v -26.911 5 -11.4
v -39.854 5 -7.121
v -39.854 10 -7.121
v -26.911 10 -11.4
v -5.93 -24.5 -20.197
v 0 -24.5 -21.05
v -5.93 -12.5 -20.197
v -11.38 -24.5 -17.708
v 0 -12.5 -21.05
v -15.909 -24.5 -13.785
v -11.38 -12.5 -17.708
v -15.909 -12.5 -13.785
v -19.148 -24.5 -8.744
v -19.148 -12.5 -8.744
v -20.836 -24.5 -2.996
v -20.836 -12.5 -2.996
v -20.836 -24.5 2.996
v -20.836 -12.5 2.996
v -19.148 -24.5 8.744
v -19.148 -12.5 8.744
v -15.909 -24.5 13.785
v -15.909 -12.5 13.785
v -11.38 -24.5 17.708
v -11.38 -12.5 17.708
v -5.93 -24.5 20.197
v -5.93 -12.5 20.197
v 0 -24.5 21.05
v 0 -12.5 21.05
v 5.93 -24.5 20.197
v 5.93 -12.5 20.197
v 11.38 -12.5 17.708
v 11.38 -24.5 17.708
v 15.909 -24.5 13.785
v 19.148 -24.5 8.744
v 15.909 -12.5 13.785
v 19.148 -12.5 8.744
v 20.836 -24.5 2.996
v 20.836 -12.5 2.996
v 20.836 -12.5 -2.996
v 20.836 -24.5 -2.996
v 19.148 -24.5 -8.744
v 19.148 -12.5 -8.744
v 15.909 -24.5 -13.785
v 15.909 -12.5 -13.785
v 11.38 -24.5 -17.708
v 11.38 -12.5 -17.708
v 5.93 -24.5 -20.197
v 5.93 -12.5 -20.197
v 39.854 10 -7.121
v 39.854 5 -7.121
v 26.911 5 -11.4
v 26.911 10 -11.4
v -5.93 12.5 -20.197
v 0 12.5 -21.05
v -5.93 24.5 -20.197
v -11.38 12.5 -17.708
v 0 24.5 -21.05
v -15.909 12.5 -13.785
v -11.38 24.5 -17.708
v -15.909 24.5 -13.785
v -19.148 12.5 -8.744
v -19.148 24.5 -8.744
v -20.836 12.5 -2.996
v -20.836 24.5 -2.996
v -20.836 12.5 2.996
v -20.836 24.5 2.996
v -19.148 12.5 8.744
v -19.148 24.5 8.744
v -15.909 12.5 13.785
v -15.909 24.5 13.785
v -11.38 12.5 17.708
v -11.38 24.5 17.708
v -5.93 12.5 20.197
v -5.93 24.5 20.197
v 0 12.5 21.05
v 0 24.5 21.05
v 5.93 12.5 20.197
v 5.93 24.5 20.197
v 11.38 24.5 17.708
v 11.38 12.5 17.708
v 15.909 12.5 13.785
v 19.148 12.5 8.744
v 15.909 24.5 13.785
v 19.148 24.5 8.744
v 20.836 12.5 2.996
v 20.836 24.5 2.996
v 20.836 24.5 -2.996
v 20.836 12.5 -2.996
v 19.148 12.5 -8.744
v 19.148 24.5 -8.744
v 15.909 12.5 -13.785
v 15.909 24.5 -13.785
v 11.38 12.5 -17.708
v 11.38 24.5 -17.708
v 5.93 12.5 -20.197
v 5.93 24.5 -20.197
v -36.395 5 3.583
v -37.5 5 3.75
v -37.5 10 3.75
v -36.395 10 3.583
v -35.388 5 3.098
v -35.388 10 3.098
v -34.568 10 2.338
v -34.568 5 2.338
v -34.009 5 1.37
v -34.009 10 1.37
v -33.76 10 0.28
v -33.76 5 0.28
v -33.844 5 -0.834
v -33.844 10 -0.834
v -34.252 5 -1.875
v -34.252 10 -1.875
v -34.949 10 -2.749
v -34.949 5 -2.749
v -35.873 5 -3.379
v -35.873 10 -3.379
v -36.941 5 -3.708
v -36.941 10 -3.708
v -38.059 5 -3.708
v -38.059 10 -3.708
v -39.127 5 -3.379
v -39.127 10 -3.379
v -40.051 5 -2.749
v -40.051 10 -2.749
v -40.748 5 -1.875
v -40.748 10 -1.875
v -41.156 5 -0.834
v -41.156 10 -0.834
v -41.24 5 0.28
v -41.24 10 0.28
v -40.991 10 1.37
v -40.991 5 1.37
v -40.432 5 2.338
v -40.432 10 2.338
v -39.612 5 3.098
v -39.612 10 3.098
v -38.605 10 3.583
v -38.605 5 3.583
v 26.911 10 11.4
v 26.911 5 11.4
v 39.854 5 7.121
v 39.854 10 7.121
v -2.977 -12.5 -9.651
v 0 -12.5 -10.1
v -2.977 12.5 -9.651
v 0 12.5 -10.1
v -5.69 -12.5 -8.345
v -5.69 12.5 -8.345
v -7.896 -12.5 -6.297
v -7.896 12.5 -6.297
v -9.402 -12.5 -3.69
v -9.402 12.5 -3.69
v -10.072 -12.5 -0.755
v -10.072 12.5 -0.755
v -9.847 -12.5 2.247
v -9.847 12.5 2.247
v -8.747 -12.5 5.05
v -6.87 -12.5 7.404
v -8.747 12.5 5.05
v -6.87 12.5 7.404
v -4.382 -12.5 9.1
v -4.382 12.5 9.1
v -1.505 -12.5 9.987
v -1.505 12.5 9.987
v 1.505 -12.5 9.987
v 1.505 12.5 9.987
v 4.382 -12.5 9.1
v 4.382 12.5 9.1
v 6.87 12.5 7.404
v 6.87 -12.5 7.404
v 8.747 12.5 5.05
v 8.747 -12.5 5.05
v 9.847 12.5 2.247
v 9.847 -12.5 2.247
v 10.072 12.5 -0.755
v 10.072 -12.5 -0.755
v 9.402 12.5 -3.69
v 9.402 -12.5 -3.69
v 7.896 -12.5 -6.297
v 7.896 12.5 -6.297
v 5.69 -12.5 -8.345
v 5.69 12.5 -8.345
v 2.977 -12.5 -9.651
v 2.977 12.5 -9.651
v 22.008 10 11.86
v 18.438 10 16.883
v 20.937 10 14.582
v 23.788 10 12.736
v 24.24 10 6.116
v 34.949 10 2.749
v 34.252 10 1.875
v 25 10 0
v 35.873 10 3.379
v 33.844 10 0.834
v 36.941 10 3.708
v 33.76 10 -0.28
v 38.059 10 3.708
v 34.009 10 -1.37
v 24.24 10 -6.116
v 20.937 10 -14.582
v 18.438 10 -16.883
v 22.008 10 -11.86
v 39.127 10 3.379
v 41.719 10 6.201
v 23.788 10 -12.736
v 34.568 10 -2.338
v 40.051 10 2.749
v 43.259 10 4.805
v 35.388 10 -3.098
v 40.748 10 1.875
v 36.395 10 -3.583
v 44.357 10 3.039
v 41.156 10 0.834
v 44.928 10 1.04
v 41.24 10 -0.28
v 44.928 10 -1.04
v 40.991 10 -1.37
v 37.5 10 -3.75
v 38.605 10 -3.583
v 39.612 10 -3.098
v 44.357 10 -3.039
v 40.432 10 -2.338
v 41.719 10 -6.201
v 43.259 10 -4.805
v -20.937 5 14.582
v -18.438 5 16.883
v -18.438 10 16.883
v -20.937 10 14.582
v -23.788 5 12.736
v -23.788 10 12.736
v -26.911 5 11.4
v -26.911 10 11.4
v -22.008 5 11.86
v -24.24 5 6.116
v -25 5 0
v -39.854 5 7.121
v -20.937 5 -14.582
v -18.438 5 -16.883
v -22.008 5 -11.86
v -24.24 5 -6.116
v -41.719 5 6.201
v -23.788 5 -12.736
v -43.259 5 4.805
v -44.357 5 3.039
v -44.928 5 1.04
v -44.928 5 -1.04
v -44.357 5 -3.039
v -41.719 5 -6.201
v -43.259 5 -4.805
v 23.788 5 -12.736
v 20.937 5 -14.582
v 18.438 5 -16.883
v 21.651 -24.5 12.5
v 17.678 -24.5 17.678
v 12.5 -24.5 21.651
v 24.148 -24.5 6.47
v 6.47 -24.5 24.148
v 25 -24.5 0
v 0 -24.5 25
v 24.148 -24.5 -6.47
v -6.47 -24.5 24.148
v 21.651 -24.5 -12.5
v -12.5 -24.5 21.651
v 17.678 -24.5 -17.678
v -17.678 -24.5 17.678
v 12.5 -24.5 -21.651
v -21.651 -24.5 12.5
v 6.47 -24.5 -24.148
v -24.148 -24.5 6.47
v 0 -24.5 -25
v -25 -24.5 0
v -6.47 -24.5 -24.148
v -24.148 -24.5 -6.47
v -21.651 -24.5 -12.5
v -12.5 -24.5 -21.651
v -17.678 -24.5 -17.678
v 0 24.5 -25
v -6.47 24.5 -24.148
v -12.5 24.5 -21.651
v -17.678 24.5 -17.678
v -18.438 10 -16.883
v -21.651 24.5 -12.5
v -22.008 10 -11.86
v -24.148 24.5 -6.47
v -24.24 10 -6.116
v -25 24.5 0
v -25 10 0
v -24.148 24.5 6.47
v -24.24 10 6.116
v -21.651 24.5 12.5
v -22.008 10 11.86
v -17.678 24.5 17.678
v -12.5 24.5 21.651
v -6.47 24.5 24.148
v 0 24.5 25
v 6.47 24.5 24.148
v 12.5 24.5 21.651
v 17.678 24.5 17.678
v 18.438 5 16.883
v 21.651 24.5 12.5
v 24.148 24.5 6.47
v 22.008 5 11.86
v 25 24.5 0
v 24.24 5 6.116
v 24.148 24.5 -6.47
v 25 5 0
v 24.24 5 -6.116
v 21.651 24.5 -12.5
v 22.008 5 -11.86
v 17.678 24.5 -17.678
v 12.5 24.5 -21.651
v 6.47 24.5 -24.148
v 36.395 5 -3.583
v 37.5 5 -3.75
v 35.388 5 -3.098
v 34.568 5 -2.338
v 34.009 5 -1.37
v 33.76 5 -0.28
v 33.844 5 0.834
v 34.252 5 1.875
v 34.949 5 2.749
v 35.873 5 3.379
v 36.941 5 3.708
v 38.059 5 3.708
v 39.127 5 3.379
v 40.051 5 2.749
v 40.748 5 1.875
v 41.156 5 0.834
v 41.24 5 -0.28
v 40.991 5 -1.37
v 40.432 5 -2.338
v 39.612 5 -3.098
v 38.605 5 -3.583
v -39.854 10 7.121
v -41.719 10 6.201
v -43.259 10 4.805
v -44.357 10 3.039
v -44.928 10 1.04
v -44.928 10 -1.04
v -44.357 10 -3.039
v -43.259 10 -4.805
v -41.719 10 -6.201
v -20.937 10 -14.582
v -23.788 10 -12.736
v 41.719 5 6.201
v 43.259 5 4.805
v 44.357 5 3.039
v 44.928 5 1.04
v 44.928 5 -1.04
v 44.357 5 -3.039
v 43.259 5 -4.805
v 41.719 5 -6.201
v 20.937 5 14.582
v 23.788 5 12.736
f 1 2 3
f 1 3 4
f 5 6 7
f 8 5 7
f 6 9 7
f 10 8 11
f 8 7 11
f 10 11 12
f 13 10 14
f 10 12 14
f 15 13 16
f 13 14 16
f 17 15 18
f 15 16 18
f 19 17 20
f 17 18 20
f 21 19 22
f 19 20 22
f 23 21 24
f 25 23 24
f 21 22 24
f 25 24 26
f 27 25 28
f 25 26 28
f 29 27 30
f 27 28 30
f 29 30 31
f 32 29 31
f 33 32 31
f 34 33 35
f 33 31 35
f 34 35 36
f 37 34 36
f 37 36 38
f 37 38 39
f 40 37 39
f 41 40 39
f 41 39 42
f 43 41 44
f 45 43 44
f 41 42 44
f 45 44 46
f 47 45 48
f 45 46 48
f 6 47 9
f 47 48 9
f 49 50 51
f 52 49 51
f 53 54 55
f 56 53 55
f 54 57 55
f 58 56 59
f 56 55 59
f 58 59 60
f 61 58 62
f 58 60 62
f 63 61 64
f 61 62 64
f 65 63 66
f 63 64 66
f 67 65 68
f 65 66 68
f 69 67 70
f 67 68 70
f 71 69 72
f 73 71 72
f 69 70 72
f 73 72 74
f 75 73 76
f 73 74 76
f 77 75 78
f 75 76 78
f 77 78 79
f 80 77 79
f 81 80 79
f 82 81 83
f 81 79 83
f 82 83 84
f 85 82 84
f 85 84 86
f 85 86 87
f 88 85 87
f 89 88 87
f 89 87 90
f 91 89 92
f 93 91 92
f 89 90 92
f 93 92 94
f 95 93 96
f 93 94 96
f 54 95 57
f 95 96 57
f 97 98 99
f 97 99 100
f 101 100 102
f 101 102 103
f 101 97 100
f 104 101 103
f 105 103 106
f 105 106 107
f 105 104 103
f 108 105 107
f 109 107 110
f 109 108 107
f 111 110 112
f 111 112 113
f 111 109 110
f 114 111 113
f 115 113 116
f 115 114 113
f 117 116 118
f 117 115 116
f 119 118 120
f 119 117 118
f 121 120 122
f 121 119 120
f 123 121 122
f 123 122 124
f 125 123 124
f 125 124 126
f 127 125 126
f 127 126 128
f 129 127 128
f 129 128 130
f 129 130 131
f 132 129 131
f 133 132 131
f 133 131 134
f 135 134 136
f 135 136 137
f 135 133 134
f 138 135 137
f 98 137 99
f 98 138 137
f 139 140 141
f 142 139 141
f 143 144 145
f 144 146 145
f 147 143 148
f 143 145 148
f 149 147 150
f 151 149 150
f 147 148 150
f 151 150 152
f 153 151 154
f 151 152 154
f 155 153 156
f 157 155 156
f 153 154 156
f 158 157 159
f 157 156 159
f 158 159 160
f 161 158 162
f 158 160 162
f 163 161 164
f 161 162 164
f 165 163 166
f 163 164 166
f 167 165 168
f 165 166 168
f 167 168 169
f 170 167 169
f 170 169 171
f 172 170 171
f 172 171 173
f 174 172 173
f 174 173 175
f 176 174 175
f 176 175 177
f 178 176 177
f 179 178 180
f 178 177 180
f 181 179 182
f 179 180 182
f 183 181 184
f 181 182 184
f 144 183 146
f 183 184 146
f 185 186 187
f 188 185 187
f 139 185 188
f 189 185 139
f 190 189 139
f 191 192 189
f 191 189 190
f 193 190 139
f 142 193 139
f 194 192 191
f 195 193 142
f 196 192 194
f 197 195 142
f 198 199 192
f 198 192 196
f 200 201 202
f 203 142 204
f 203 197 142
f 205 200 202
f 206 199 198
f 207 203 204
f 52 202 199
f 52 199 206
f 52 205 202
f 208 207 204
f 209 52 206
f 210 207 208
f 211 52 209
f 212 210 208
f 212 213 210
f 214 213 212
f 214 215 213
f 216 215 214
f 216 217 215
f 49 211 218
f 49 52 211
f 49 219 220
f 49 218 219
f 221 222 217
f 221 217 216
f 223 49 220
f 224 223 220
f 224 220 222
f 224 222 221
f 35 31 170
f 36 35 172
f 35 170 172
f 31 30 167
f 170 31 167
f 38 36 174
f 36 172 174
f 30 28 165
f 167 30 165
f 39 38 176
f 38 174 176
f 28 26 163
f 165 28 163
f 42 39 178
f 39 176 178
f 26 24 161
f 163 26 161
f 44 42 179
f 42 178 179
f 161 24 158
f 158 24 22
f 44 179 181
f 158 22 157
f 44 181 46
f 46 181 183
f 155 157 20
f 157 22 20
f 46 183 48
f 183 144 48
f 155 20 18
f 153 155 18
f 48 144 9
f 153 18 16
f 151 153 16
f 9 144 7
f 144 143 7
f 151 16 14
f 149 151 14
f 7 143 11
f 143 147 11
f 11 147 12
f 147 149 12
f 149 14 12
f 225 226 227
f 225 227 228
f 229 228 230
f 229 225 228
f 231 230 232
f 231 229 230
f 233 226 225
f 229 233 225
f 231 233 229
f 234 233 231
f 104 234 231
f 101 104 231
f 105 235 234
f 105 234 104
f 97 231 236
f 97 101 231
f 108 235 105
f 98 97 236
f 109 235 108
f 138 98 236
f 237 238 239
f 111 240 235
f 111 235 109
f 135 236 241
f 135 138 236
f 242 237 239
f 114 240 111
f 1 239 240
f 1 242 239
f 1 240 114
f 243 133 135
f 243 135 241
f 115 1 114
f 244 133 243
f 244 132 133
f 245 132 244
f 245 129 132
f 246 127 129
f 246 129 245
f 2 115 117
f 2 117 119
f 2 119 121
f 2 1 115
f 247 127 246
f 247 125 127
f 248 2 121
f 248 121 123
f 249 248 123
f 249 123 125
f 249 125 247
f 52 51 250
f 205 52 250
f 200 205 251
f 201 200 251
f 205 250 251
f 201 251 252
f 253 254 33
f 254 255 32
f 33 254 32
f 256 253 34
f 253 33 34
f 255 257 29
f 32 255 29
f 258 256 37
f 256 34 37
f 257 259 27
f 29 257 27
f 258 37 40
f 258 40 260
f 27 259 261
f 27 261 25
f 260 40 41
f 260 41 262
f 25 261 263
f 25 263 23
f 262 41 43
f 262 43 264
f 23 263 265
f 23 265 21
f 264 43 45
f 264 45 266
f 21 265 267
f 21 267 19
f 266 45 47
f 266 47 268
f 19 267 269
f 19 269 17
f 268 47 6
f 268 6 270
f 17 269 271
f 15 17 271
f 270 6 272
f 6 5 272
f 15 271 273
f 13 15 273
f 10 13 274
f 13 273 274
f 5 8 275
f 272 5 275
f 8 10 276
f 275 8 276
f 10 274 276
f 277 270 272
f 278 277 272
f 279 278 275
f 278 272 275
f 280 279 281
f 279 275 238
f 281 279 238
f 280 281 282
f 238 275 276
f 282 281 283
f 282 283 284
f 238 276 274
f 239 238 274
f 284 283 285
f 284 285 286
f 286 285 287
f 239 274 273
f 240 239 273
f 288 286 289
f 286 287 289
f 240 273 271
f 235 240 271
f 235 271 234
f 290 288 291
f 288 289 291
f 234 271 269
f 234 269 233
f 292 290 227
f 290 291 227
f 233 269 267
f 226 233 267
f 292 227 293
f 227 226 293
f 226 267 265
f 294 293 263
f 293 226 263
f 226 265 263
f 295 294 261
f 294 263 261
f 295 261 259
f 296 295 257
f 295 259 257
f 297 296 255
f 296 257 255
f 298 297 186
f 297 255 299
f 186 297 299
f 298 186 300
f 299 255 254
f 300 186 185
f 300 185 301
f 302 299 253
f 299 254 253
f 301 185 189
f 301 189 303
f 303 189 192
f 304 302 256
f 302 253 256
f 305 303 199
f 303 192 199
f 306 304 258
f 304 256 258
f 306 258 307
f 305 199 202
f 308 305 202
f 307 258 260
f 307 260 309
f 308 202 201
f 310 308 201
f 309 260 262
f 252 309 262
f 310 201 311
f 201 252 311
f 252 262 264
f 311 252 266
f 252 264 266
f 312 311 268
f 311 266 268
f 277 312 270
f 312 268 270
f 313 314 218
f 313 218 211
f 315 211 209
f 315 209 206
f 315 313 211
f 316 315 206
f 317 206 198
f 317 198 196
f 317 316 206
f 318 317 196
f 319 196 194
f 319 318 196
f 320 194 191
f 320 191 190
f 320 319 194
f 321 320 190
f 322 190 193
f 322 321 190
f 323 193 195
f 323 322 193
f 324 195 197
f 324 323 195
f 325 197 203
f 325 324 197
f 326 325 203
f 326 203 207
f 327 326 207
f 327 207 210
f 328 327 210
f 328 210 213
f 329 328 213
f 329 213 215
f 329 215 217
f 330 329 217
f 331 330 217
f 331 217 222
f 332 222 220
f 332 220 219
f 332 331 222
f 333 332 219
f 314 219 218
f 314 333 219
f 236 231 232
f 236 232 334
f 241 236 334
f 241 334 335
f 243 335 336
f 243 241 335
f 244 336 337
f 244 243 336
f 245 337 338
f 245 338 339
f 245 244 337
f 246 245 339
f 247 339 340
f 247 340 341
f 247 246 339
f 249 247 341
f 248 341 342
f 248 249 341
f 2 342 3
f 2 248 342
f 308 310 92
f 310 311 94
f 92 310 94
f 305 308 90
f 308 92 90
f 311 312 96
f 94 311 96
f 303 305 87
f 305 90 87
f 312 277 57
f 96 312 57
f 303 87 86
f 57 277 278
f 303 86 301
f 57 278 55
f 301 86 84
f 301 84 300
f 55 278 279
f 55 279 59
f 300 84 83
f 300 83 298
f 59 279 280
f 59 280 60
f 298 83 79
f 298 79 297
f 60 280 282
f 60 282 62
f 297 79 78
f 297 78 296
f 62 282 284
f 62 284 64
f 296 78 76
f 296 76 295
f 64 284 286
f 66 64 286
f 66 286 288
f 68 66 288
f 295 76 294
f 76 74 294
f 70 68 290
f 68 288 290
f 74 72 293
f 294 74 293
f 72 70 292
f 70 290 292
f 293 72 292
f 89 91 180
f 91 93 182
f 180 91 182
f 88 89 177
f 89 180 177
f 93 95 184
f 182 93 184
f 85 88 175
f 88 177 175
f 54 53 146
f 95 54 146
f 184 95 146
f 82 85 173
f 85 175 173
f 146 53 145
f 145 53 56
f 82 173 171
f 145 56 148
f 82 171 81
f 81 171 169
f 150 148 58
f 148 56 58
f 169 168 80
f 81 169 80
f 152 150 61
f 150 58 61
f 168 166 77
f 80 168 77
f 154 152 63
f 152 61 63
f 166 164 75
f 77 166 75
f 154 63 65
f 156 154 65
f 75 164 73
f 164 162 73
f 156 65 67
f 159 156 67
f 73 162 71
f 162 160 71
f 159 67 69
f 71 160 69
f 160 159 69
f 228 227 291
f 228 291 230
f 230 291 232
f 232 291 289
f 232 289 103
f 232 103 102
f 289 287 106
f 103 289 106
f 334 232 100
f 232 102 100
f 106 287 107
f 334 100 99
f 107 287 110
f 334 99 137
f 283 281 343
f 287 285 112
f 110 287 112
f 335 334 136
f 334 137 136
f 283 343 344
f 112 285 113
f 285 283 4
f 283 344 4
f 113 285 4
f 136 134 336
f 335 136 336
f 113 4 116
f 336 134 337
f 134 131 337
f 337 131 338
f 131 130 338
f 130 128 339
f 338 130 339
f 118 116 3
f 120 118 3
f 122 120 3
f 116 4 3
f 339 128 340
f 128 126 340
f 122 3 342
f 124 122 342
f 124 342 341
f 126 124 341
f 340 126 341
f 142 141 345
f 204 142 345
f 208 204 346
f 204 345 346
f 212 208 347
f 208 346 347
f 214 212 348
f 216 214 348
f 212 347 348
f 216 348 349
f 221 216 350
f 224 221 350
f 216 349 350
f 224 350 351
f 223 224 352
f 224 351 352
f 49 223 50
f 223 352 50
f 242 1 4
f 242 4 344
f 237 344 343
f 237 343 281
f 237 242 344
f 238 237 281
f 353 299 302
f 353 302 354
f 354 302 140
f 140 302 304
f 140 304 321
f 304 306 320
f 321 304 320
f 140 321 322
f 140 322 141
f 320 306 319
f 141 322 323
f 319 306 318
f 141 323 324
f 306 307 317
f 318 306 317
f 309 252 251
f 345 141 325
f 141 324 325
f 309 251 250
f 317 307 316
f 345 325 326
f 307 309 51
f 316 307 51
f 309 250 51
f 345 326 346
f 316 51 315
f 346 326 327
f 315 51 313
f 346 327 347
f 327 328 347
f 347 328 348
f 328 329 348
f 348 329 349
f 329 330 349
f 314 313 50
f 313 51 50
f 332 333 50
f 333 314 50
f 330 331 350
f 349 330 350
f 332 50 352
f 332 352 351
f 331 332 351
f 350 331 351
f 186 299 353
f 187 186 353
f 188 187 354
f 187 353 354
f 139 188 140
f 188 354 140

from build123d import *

# Parameters (mm, degrees)
BOSS_EXTRUDE1_START = 5
SKETCH2_R           = 3.75
BOSS_EXTRUDE1_DEPTH = 5


with BuildPart() as part:
    # Sketch1 → Revolve1 (revolve)
    with BuildSketch(Plane.XY, mode=Mode.PRIVATE) as revolve1_sk:
        Polygon((21.05, 24.5), (25, 24.5), (25, -24.5), (21.05, -24.5), (21.05, -12.5), (10.1, -12.5), (10.1, 12.5), (21.05, 12.5), align=None)
    revolve(revolve1_sk.sketch.rotate(Axis((0, 0, 0), (0, 1, 0)), 90), axis=Axis((0, 0, 0), (0, 1, 0)))

    # Sketch2 → Boss-Extrude1 (add)
    # profile 1 of 2: a face of its own
    with BuildSketch(Plane(origin=(0, 0, 0), x_dir=(1, 0, 0), z_dir=(0, 1, 0)).offset(BOSS_EXTRUDE1_START)):
        with BuildLine():
            Line((-39.854181584, 7.12094299), (-26.911060299, 11.399934945))
            ThreePointArc((-26.911060299, 11.399934945), (-22.323138818, 13.598174791), (-18.438265476, 16.882842362))
            Line((-18.438265476, 16.882842362), (-18.438265476, -16.882842362))
            ThreePointArc((-18.438265476, -16.882842362), (-22.323138818, -13.598174791), (-26.911060299, -11.399934945))
            Line((-26.911060299, -11.399934945), (-39.854181584, -7.12094299))
            ThreePointArc((-39.854181584, -7.12094299), (-45, 0), (-39.854181584, 7.12094299))
        make_face()
        with Locations(Location((-37.5, 0, 0), (0, 0, 270))):
            Circle(SKETCH2_R, mode=Mode.SUBTRACT)
    # profile 2 of 2: a face of its own
    with BuildSketch(Plane(origin=(0, 0, 0), x_dir=(1, 0, 0), z_dir=(0, 1, 0)).offset(BOSS_EXTRUDE1_START)):
        with BuildLine():
            Line((18.438265476, 16.882842362), (18.438265476, -16.882842362))
            ThreePointArc((18.438265476, -16.882842362), (22.323138818, -13.598174791), (26.911060299, -11.399934945))
            Line((26.911060299, -11.399934945), (39.854181584, -7.12094299))
            ThreePointArc((39.854181584, -7.12094299), (45, 0), (39.854181584, 7.12094299))
            Line((39.854181584, 7.12094299), (26.911060299, 11.399934945))
            ThreePointArc((26.911060299, 11.399934945), (22.323138818, 13.598174791), (18.438265476, 16.882842362))
        make_face()
        with Locations(Location((37.5, 0, 0), (0, 0, 90))):
            Circle(SKETCH2_R, mode=Mode.SUBTRACT)
    extrude(amount=BOSS_EXTRUDE1_DEPTH)


solid = part.part
